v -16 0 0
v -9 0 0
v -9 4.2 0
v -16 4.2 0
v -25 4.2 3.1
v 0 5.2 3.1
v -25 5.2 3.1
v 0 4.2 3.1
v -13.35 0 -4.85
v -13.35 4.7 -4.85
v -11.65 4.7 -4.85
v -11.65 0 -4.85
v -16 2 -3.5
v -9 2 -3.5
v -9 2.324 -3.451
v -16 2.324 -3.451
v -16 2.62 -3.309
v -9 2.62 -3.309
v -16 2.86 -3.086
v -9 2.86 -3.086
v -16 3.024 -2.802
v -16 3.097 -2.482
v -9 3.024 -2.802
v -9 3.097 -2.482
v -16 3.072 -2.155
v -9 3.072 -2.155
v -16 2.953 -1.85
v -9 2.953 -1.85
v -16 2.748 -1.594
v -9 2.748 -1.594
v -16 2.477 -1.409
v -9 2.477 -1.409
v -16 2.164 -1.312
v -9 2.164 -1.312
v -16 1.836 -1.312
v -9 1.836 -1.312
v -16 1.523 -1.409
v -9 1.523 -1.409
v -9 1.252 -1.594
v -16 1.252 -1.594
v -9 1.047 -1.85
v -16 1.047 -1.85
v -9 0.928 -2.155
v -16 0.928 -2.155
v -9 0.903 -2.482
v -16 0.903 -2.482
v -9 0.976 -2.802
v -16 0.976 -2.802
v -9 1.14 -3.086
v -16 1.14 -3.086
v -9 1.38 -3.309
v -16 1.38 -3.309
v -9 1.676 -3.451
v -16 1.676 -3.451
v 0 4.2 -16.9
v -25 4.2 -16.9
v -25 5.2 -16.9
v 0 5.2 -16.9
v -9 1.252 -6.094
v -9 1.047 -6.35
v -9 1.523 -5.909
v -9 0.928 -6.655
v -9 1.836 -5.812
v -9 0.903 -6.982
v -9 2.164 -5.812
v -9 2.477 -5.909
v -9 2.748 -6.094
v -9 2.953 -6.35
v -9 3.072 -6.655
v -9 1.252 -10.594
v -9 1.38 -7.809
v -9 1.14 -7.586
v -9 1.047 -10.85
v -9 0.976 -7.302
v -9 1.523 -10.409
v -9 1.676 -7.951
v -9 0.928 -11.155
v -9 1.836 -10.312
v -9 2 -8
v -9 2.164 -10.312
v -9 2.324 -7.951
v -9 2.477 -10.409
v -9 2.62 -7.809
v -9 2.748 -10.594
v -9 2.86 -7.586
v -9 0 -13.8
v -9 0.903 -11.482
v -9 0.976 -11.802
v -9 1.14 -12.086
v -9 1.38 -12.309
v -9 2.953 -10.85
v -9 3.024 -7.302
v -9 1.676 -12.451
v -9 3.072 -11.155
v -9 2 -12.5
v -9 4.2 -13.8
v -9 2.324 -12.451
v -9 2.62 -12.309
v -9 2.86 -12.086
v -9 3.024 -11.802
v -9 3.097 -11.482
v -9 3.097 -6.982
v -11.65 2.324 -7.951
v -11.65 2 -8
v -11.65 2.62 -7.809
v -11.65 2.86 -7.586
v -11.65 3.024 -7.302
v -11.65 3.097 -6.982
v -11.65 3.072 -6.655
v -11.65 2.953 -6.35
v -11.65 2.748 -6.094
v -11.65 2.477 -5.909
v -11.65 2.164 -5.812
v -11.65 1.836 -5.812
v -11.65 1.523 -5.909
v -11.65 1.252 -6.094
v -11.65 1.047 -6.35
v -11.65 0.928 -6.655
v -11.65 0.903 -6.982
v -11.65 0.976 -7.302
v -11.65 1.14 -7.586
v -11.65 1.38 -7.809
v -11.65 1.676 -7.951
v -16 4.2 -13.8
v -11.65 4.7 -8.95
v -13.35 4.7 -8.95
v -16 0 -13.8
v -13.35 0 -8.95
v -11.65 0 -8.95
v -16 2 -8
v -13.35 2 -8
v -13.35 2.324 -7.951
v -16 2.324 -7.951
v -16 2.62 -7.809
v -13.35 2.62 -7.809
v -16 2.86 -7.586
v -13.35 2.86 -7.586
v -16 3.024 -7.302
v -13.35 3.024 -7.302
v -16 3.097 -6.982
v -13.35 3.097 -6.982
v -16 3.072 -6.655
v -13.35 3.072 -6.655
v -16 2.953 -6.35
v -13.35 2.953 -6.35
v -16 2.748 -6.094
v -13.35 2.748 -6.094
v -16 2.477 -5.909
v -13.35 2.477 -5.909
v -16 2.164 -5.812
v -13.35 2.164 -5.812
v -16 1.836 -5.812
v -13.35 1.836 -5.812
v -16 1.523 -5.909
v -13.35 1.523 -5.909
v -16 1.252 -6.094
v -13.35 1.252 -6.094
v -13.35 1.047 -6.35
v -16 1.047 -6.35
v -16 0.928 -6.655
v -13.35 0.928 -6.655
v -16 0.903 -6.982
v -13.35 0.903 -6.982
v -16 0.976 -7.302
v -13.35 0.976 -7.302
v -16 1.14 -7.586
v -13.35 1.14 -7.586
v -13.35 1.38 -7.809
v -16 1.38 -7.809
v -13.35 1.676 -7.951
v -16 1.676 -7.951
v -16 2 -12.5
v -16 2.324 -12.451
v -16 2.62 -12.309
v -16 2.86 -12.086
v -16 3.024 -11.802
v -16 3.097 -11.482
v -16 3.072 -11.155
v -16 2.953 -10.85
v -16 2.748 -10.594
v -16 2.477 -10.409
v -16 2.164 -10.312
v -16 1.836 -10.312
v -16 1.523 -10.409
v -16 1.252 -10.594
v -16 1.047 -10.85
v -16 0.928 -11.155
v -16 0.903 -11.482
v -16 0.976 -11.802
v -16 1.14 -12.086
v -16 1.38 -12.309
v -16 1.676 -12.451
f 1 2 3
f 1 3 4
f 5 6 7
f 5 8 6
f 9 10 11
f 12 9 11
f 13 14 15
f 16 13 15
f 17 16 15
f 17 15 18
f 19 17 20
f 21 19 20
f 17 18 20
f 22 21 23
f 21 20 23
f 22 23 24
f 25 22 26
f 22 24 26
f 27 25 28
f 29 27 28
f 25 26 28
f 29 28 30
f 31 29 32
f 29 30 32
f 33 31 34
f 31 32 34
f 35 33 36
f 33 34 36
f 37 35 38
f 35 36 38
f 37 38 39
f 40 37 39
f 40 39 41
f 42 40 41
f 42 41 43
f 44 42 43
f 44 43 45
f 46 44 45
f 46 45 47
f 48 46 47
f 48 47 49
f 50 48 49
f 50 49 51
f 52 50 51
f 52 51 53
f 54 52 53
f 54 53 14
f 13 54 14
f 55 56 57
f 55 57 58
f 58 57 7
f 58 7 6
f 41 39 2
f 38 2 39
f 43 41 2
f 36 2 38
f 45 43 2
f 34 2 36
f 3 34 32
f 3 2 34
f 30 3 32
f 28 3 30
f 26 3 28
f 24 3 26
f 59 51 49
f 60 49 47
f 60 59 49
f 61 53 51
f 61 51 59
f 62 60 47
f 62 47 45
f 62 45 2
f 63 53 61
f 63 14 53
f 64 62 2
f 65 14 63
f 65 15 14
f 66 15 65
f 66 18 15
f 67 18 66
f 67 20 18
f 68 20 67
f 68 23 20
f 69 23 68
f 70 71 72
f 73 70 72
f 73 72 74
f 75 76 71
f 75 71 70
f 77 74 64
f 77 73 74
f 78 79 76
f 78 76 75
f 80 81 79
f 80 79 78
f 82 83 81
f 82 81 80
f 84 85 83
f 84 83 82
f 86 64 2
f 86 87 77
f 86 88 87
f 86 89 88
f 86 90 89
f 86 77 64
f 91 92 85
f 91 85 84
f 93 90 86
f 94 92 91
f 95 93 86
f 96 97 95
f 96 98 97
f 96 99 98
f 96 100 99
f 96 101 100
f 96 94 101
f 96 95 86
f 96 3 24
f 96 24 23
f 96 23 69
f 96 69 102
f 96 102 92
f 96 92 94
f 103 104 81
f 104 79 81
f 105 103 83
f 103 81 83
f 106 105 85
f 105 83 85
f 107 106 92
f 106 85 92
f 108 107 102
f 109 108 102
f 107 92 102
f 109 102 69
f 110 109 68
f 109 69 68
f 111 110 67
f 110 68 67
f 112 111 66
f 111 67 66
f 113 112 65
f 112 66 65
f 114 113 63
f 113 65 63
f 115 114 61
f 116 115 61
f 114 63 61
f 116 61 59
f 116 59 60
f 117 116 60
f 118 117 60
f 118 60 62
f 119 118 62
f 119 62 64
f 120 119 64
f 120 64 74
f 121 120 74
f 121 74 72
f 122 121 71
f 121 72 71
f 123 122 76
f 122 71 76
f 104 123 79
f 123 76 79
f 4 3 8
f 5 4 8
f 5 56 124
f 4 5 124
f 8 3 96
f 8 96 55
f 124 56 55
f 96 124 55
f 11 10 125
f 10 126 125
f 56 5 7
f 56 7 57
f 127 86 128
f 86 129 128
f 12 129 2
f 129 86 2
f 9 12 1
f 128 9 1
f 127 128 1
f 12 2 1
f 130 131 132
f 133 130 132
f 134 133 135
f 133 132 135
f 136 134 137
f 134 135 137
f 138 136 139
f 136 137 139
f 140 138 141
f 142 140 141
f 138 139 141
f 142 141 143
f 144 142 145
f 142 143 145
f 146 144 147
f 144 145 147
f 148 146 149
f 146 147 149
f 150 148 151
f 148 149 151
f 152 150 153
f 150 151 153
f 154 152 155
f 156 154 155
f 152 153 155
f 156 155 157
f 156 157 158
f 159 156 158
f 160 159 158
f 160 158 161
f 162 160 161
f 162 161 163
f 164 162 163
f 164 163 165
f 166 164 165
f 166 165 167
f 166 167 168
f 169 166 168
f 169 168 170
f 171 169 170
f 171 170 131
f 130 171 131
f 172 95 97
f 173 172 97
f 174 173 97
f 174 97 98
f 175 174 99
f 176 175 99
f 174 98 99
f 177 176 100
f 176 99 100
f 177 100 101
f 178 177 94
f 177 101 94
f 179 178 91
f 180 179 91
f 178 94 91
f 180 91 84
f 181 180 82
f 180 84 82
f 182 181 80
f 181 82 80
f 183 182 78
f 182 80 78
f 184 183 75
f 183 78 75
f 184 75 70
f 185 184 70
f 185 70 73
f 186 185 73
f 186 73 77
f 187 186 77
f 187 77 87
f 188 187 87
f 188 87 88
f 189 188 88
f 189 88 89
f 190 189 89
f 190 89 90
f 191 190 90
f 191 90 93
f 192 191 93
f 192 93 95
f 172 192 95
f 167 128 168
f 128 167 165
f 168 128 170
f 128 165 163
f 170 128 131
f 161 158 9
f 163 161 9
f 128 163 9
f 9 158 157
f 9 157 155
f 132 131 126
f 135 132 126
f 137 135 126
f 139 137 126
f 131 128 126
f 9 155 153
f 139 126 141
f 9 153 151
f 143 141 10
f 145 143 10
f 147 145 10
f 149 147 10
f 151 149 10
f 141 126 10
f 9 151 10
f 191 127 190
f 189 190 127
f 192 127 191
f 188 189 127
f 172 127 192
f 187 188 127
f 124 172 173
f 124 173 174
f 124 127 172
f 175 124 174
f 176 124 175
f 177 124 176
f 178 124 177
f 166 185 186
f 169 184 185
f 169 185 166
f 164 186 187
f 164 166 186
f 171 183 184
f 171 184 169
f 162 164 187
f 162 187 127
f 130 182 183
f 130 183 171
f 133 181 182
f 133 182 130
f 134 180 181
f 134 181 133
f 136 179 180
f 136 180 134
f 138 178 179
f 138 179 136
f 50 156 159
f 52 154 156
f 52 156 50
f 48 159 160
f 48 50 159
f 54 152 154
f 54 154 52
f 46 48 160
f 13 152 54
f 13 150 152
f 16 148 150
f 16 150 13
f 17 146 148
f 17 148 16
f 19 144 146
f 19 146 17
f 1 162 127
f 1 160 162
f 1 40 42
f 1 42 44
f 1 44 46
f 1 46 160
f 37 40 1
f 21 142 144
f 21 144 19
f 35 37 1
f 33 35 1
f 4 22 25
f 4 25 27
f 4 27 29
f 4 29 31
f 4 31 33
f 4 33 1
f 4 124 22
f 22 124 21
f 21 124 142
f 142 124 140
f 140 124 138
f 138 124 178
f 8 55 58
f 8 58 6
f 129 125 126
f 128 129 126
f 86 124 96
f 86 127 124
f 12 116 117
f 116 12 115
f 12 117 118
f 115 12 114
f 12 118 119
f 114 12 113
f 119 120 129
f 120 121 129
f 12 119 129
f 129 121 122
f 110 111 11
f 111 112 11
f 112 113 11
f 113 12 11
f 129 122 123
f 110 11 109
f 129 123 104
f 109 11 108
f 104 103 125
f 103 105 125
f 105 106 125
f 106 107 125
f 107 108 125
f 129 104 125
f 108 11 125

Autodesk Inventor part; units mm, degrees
ref_plane "YZ Plane" through (0, 0, 0) normal (1, 0, 0) x (0, 1, 0)
ref_plane "XZ Plane" through (0, 0, 0) normal (0, 1, 0) x (-1, 0, 0)
sketch "Sketch1" plane through (0, 0, 0) normal (0, 1, 0) x (-1, 0, 0)
  line L0 (0, 0) -> (25, 0)
  line L1 (25, 0) -> (25, -13.8)
  line L2 (25, -13.8) -> (0, -13.8)
  line L3 (0, -13.8) -> (0, 0)
  dimension "d0" = 25
  dimension "d1" = 13.8
extrude "Extrusion1" add sketch "Sketch1" along normal blind 4.2
sketch "Sketch2" plane through (0, 0, 0) normal (1, 0, 0) x (0, 0, -1)
  line L0 (0, 0) -> (0, 4.2)
  line L1 (0, 2) -> (13.8, 2)
  line L2 (13.8, 0) -> (13.8, 4.2)
  circle A0 centre (2.4, 2) radius 1.05
  circle A1 centre (11.4, 2) radius 1.05
  line L3 (0, 0) -> (13.8, 0) projected
  line L4 (6.9, 0) -> (6.9, 2.0025)
  line L5 (0, 4.2) -> (13.8, 4.2) projected
  dimension "d4" = 9
  dimension "d7" = 4.5
  dimension "d15" = 2.2
extrude "Extrusion2" cut sketch "Sketch2" against normal blind 20 contours A0 L1 | L1 A0 | A1 L1 | L1 A1
sketch "Sketch3" plane through (0, 4.2, 0) normal (0, 1, 0) x (1, 0, 0)
  line L0 (0, 6.9) -> (-25, 6.9)
  line L1 (0, -3.1) -> (-25, -3.1)
  line L2 (-25, -3.1) -> (-25, 16.9)
  line L3 (-25, 16.9) -> (0, 16.9)
  line L4 (0, 16.9) -> (0, -3.1)
  line L5 (0, -3.1) -> (-25, 16.9) construction
  line L6 (-25, -3.1) -> (0, 16.9) construction
  line L7 (-25, 13.8) -> (-25, 0) projected
  line L8 (0, 0) -> (0, 13.8) projected
  line L9 (0, 13.8) -> (-25, 13.8) projected
  point P0 (-12.5, 6.9)
  dimension "d10" = 20
  dimension "d11" = 6.9
  dimension "d12" = 25
extrude "Extrusion3" add sketch "Sketch3" along normal blind 1
sketch "Sketch4" plane through (0, 5.2, 0) normal (0, 1, 0) x (1, 0, 0)
  circle A0 centre (-21, 12.9) radius 0.25
  line L0 (0, 16.9) -> (-25, 16.9) projected
  line L1 (-25, 16.9) -> (-25, -3.1) projected
  line L2 (-21.25, 12.9) -> (-20.75, 12.9)
  point P0 (0, 0)
  dimension "d16" = 4
  dimension "d17" = 4
  dimension "d18" = 0.5
ref_plane "Work Plane1" through (-21.25, 5.2, -12.9) normal (0, 0, 1) x (1, 0, 0)
sketch "Sketch5" plane through (-21.25, 5.2, -12.9) normal (0, 0, 1) x (1, 0, 0)
  line L0 (-3.75, 0) -> (21.25, 0) projected
  line L1 (0.2469, 0) -> (0.2469, 2)
  line L2 (0.2469, 2) -> (0.9969, 0)
  line L3 (0.9969, 0) -> (0.2469, 0)
  line L4 (21.25, -1) -> (-3.75, -1) projected
  point P0 (21.25, -5.2)
  dimension "d21" = 2
  dimension "d28" = 0.75
revolve "Revolution1" [suppressed]
pattern_linear "Rectangular Pattern1" [suppressed]
sketch "Sketch6" plane through (0, 0, 0) normal (1, 0, 0) x (0, 0, -1)
  circle A0 centre (2.4, 2) radius 1.05 projected
  circle A1 centre (2.4, 2) radius 1.1
  circle A2 centre (11.4, 2) radius 1.05 projected
  circle A3 centre (11.4, 2) radius 1.1
  point P0 (0, 0)
  dimension "d29" = 2.2
  dimension "d30" = 2.2
extrude "Extrusion4" cut sketch "Sketch6" against normal blind 30.5 contours A0 | A1 | A2 | A3
sketch "Sketch7" plane through (0, 5.2, 0) normal (0, 1, 0) x (1, 0, 0)
  line L0 (0, 6.9) -> (-25, 6.9) construction
  line L1 (0, 16.9) -> (-25, 16.9) projected
  line L2 (-13.35, 4.85) -> (-11.65, 4.85)
  line L3 (-11.65, 4.85) -> (-11.65, 8.95)
  line L4 (-11.65, 8.95) -> (-13.35, 8.95)
  line L5 (-13.35, 8.95) -> (-13.35, 4.85)
  line L6 (-13.35, 4.85) -> (-11.65, 8.95) construction
  line L7 (-11.65, 4.85) -> (-13.35, 8.95) construction
  line L8 (0, -3.1) -> (0, 16.9) projected
  point P0 (0, 0)
  point P1 (-12.5, 6.9)
  dimension "d33" = 10
  dimension "d34" = 1.7
  dimension "d35" = 4.1
  dimension "d36" = 11.65
extrude "Extrusion5" cut sketch "Sketch7" against normal blind 8.45
sketch "Sketch8" plane through (0, 0, 0) normal (1, 0, 0) x (0, 0, -1)
  circle A0 centre (2.4, 2) radius 1.1 projected
  circle A1 centre (11.4, 2) radius 1.1 projected
  line L0 (2.4, 2) -> (11.4, 2) construction
  circle A2 centre (6.9, 2) radius 1.1
  point P0 (0, 0)
  dimension "d39" = 2.2
  dimension "d40" = 4.5
extrude "Extrusion6" cut sketch "Sketch8" against normal blind 31.95 contours A2
sketch "Sketch9" plane through (0, 5.2, 0) normal (0, 1, 0) x (1, 0, 0)
  line L0 (-13.35, 4.85) -> (-13.35, 8.95) projected
  line L1 (-11.65, 4.85) -> (-11.65, 8.95) projected
  line L2 (-13.35, 8.95) -> (-11.65, 8.95)
  line L3 (-11.65, 8.95) -> (-11.65, 4.85)
  line L4 (-11.65, 4.85) -> (-13.35, 4.85)
  line L5 (-13.35, 4.85) -> (-13.35, 8.95)
  point P0 (0, 0)
extrude "Extrusion7" add sketch "Sketch9" against normal blind 0.5
sketch "Sketch10" plane through (0, 0, 0) normal (1, 0, 0) x (0, 0, -1)
  line L0 (0, 0) -> (13.8, 0)
  line L1 (13.8, 0) -> (13.8, 4.2)
  line L2 (13.8, 4.2) -> (0, 4.2)
  line L3 (0, 4.2) -> (0, 0)
  line L4 (13.8, 4.2) -> (16.9, 4.2) projected
  line L5 (13.8, 0) -> (13.8, 4.2) projected
extrude "Extrusion8" cut sketch "Sketch10" against normal blind 9
sketch "Sketch11" plane through (-25, 0, -13.8) normal (-1, 0, 0) x (0, 0, 1)
  line L0 (13.8, 0) -> (13.8, 4.2) projected
  line L1 (0, 0) -> (13.8, 0)
  line L2 (13.8, 0) -> (13.8, 4.2)
  line L3 (13.8, 4.2) -> (0, 4.2)
  line L4 (0, 4.2) -> (0, 0)
  line L5 (13.8, 4.2) -> (16.9, 4.2) projected
extrude "Extrusion9" cut sketch "Sketch11" against normal blind 9
properties part number "Moving platform"
